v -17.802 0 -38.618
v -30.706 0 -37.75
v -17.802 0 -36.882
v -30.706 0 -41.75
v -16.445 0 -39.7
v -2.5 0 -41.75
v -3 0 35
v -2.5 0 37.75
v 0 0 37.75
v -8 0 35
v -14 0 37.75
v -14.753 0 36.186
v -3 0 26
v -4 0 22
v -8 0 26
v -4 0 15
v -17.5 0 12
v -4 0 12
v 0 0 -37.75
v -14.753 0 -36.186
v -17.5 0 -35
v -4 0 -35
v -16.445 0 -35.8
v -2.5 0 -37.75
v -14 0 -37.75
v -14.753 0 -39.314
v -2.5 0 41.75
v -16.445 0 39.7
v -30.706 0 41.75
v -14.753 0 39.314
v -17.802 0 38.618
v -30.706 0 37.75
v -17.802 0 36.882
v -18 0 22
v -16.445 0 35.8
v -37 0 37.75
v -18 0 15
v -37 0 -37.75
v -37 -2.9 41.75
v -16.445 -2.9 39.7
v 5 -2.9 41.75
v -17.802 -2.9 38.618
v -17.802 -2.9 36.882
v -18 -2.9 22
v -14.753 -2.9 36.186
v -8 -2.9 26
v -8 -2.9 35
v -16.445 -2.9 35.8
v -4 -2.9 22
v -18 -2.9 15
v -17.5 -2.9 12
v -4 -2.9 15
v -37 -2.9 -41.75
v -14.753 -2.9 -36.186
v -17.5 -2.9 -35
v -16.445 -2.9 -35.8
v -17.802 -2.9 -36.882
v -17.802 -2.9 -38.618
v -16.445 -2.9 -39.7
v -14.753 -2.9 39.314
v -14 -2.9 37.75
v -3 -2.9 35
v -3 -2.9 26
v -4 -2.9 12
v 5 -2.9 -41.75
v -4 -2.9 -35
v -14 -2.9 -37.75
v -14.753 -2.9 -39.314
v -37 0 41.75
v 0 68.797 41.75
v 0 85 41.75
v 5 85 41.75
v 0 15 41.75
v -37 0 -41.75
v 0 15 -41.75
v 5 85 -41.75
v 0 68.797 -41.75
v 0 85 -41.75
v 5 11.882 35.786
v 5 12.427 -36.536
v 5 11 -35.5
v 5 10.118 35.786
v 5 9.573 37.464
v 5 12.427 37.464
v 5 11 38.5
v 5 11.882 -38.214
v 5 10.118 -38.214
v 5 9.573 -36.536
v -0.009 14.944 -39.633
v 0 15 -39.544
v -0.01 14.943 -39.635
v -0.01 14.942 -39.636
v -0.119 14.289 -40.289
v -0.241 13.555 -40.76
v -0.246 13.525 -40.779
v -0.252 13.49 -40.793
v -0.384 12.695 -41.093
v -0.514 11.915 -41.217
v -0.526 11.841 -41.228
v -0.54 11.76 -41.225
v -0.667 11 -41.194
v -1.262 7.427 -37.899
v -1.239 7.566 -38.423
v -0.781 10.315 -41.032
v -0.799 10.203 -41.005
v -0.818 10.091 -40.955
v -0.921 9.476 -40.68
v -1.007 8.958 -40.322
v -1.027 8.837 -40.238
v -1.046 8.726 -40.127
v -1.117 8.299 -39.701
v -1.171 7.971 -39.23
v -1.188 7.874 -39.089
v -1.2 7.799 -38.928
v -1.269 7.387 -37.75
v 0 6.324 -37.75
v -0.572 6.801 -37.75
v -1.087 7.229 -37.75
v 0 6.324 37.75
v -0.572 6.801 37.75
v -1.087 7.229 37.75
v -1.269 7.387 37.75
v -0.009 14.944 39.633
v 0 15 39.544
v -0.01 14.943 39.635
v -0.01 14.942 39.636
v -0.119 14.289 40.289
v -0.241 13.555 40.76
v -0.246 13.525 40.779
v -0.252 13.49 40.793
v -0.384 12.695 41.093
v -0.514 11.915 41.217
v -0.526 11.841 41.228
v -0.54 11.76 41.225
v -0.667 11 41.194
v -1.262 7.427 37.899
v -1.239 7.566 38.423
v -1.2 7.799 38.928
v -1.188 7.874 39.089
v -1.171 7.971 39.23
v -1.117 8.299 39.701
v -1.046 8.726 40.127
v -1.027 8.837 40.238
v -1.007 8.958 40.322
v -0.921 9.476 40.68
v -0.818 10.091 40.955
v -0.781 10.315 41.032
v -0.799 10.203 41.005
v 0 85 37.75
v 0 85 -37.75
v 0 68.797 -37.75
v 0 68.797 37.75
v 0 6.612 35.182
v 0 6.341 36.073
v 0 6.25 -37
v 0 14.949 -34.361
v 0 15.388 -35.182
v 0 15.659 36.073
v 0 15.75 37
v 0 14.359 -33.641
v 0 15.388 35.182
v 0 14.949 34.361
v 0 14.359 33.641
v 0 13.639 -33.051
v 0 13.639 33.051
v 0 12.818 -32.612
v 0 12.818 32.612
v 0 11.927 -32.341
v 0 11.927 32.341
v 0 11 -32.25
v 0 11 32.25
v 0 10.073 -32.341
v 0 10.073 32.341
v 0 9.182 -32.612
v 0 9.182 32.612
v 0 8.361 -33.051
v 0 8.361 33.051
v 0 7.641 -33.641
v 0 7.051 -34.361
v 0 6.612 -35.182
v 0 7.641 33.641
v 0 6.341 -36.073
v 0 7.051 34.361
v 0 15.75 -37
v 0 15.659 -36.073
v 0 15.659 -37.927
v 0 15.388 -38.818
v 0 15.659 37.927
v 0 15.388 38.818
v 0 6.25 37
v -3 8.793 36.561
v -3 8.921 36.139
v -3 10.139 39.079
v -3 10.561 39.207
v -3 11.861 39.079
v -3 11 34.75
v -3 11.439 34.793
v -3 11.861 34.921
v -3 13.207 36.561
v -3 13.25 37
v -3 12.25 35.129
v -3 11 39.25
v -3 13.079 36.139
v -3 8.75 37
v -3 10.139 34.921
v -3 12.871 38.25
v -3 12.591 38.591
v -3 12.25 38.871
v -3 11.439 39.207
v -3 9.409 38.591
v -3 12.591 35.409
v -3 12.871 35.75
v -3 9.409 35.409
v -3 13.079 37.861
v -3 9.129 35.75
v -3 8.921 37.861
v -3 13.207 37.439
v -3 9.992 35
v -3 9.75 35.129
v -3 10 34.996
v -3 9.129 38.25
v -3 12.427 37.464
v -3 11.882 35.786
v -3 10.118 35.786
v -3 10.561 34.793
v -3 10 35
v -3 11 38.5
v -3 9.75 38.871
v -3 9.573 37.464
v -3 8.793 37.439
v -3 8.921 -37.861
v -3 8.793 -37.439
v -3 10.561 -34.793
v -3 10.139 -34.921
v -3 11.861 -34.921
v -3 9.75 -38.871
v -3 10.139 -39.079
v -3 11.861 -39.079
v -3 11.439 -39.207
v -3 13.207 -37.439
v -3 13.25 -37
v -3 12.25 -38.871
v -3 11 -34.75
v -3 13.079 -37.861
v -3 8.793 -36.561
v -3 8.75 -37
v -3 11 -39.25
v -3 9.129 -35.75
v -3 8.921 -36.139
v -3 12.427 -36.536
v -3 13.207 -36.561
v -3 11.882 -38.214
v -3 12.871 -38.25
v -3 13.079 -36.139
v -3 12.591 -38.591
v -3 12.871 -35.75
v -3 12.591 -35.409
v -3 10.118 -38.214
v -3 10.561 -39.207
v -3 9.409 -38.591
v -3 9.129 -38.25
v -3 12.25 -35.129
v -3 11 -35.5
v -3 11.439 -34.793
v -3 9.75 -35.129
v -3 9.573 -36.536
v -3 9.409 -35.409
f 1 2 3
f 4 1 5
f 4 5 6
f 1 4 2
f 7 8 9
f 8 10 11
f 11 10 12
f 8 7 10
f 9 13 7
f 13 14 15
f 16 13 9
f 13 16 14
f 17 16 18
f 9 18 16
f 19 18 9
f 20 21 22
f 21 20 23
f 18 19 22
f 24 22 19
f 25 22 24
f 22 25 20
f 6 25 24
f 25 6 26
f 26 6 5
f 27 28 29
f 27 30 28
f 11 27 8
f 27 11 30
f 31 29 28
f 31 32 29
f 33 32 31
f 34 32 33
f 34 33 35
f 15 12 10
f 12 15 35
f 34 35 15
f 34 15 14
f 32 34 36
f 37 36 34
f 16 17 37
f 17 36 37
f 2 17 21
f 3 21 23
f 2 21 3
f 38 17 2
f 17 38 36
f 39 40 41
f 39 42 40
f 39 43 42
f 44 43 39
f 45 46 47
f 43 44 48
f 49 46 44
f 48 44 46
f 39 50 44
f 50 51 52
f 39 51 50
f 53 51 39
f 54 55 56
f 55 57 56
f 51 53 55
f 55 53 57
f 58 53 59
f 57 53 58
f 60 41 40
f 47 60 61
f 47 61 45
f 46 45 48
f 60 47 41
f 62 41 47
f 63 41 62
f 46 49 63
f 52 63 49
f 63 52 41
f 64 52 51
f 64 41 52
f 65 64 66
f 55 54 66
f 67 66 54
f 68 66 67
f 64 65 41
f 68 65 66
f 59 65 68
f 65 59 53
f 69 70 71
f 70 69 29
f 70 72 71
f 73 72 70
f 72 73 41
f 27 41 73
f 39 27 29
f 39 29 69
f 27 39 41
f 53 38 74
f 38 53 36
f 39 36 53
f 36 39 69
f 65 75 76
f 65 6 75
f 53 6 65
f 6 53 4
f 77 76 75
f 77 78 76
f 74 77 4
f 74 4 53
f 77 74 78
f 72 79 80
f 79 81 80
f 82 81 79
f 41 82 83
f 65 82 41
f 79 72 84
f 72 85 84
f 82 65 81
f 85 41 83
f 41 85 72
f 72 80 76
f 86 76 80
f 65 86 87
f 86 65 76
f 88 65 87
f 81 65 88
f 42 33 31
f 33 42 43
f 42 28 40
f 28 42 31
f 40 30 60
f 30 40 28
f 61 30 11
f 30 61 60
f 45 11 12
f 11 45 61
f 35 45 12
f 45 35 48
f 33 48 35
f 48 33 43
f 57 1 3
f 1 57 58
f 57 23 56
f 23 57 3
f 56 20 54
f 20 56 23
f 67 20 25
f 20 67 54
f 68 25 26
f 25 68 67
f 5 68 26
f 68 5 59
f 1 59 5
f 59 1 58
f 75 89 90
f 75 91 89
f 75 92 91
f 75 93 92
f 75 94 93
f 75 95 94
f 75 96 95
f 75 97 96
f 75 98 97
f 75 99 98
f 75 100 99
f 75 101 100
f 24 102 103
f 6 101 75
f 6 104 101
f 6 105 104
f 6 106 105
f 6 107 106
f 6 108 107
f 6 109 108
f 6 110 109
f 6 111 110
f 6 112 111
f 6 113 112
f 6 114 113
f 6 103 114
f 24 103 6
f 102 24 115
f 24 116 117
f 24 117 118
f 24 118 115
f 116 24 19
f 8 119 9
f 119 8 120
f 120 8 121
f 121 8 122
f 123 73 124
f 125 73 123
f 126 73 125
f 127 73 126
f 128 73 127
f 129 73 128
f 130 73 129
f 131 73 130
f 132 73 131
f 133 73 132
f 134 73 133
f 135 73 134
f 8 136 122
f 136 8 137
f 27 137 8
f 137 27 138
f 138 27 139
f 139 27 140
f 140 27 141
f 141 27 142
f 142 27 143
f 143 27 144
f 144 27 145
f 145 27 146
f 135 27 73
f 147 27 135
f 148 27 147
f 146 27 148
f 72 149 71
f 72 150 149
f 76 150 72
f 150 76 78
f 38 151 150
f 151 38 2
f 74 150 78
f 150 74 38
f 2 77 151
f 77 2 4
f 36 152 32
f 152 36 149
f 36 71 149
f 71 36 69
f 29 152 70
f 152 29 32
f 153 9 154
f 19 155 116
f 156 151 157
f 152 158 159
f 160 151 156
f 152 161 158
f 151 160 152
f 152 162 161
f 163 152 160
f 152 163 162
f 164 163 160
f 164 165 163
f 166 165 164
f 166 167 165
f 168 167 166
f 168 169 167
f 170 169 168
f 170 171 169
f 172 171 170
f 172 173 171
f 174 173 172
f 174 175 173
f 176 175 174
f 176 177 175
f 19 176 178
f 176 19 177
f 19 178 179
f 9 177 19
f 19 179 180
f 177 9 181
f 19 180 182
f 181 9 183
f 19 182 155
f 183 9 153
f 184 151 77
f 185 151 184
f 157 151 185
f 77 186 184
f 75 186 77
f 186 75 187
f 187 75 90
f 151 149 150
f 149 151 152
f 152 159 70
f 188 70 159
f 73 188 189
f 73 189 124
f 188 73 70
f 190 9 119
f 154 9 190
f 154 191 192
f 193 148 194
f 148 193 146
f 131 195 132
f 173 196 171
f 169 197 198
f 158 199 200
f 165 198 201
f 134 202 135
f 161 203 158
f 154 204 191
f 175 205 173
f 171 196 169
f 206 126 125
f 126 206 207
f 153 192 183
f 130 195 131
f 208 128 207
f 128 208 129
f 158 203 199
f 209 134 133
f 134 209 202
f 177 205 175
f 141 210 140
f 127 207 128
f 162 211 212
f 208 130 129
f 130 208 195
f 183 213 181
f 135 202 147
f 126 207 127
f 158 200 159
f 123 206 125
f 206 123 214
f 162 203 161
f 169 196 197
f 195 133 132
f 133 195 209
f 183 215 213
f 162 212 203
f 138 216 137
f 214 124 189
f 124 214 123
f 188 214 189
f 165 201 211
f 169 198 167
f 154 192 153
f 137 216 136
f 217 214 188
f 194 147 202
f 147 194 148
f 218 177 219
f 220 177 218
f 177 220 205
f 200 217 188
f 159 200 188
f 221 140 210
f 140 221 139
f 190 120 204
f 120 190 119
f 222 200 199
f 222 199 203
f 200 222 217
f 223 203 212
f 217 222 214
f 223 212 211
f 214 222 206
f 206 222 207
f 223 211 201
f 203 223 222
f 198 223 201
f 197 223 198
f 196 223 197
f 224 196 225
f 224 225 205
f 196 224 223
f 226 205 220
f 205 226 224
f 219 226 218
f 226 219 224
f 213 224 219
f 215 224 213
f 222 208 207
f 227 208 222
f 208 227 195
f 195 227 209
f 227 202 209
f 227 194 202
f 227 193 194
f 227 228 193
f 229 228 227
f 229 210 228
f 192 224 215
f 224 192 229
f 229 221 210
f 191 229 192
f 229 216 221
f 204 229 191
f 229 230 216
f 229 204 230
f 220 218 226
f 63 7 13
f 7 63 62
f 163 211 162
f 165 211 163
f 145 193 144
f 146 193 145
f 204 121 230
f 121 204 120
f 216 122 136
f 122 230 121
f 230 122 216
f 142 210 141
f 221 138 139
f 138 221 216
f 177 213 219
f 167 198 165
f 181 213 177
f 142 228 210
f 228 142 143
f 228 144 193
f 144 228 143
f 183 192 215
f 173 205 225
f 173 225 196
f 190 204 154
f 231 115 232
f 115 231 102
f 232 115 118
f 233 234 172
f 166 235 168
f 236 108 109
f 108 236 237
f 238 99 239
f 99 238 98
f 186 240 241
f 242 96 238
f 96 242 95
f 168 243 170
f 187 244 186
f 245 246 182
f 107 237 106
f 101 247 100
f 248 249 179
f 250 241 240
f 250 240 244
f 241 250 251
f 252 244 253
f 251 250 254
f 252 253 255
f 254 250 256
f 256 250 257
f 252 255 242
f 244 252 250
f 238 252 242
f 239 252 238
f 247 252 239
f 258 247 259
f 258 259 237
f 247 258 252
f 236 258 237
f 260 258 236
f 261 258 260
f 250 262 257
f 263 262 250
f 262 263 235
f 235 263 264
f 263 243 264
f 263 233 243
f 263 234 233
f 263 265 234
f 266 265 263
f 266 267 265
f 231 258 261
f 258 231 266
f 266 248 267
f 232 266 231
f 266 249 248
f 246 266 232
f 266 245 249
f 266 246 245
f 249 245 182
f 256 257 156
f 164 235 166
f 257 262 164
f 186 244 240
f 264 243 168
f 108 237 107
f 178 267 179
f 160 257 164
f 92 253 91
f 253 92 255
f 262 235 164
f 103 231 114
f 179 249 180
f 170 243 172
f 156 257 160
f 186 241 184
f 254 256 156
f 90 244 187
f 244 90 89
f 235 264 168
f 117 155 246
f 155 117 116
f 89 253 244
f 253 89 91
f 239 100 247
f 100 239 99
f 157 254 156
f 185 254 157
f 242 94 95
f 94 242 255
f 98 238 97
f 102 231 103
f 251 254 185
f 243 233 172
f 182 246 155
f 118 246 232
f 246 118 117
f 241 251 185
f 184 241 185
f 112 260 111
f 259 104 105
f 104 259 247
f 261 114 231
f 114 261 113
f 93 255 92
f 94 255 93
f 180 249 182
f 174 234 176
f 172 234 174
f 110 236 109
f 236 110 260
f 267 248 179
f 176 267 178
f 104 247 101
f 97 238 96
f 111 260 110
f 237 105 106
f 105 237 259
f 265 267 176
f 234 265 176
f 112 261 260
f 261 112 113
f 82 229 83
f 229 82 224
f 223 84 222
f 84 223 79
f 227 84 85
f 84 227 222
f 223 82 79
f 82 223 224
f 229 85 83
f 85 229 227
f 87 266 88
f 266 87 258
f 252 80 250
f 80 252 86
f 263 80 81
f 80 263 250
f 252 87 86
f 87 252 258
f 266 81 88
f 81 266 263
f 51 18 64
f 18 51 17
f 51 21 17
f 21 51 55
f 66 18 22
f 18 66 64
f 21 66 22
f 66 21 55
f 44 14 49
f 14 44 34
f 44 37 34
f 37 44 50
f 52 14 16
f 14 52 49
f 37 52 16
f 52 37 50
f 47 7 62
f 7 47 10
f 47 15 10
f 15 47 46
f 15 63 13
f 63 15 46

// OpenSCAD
// file: blank.scad
include <common.scad>

module Blank(front_thickness=5, recess_size=[segment_width - 10, segment_height - 16], recess_depth=3)
{
  color("red")
  {
    rotate([90, 0, 0])
    {
      difference()
      {
        linear_extrude(front_thickness)
        {
          FrontProjection();
        }

        translate([0, 0, -0.01])
        {
          linear_extrude(recess_depth)
          {
            square(recess_size, center=true);
          }
        }
      }
    }
  }
}

Blank();
// file: blank_with_mounting_plate.scad
include <common.scad>
use <blank.scad>

module BlankWithMountingPlate(front_thickness=5, plate_thickness=5, plate_depth=120, recess_size=[segment_width - 10, segment_height - 16], recess_depth=3, support_thickness=5, front_support_length=segment_width*0.75, panel_support_length=50, rear_support_thickness=0, rear_support_width=5)
{
  a = [-(segment_width / 2) + plate_thickness, 0, 0];

  difference()
  {
    union()
    {
      translate(a)
      {
        Blank(front_thickness, recess_size, recess_depth);
      }

      color("green")
      {
        translate([plate_thickness / 2, 0, 0])
        {
          rotate([-90, 0, 0])
          {
            linear_extrude(plate_depth)
            {
              square([plate_thickness, segment_height], center=true);
            }
          }
        }
      }

      color("blue")
      {
        dz = (segment_height / 2);
        for(z = [-dz, dz - support_thickness])
        {
          translate([0, 0, z])
          {
            hull()
            {
              cube([plate_thickness, panel_support_length, support_thickness]);

              rotate([0, 0, 180])
                cube([front_support_length, front_thickness, support_thickness]);
            }
          }
        }
      }

      color("magenta")
      {
        dz = (segment_height / 2);
        for(z = [-dz, dz - rear_support_thickness])
        {
          translate([0, 0, z])
          {
            hull()
            {
              translate([0, plate_depth - rear_support_width, 0])
              {
                cube([plate_thickness, rear_support_width, rear_support_thickness]);
              }

              rotate([0, 0, 180])
              {
                translate([segment_width - plate_thickness - rear_support_width, 0, 0])
                {
                  cube([rear_support_width, front_thickness, rear_support_thickness]);
                }
              }
            }
          }
        }
      }
    }

    translate(a)
    {
      rotate([90, 0, 0])
      {
        linear_extrude(20, center=true)
        {
          MountingHolesProjection();
        }
      }
    }
  }
}

BlankWithMountingPlate();
// file: common.scad
segment_width = 42;
segment_height = 83.5;

mounting_hole_centres = 75.5;
mounting_hole_diameter = 4;

module MountingHolesProjection()
{
  for(y = [-mounting_hole_centres/2, mounting_hole_centres/2])
  {
    translate([0, y])
    {
      circle(d=mounting_hole_diameter);
    }
  }
}

module FrontProjection()
{
  difference()
  {
    square([segment_width, segment_height], center=true);
    MountingHolesProjection();
  }
}

module Standoff(lower_diameter, upper_diameter, height)
{
  hull()
  {
    translate([0, 0, -1])
    {
      cylinder(d=lower_diameter, h=1, $fn=32);
    }

    translate([0, 0, height - 1])
    {
      cylinder(d=upper_diameter, h=1, $fn=32);
    }
  }
}
// main file
include <common.scad>
use <blank_with_mounting_plate.scad>

board_size = [80, 60];

module PlaceMountingHoles()
{
  centres = 74;

  for(x = [centres / 2, -centres / 2])
  {
    translate([x, 11])
    {
      children();
    }
  }
}

module Segment()
{
  board_offset = 3;

  difference()
  {
    union()
    {
      BlankWithMountingPlate(
          plate_depth=85,
          front_thickness=2.9,
          recess_depth=0,
          support_thickness=4,
          front_support_length=2.5,
          panel_support_length=15,
          rear_support_thickness=4);

      /* Board standoffs */
      color("cyan")
      {
        rotate([0, -90, 0])
        {
          PlaceMountingHoles()
          {
            Standoff(9.5, 4.5, board_offset);
          }
        }
      }
    }

    /* Board mounting holes */
    rotate([0, -90, 0])
    {
      PlaceMountingHoles()
      {
        cylinder(d=3, h=20, center=true);
      }
    }

    /* Port cutouts */
    translate([-board_offset, 0, 0])
    {
      rotate([0, -90, 0])
      {
        translate([-board_size[0] / 2, 0, 0])
        {
          /* Ethernet */
          translate([(47 / 2) + 5, 0, (13.5 / 2) + 1])
          {
            cube([47, 20, 13.5], center=true);
          }

          /* USB */
          translate([(7 / 2) + 55, 0, (14 / 2) + 1])
          {
            cube([7, 20, 14], center=true);
          }

          /* Micro USB */
          translate([(9 / 2) + 66, 0, 5 / 2])
          {
            cube([9, 20, 5], center=true);
          }
        }
      }
    }
  }
}

Segment();
